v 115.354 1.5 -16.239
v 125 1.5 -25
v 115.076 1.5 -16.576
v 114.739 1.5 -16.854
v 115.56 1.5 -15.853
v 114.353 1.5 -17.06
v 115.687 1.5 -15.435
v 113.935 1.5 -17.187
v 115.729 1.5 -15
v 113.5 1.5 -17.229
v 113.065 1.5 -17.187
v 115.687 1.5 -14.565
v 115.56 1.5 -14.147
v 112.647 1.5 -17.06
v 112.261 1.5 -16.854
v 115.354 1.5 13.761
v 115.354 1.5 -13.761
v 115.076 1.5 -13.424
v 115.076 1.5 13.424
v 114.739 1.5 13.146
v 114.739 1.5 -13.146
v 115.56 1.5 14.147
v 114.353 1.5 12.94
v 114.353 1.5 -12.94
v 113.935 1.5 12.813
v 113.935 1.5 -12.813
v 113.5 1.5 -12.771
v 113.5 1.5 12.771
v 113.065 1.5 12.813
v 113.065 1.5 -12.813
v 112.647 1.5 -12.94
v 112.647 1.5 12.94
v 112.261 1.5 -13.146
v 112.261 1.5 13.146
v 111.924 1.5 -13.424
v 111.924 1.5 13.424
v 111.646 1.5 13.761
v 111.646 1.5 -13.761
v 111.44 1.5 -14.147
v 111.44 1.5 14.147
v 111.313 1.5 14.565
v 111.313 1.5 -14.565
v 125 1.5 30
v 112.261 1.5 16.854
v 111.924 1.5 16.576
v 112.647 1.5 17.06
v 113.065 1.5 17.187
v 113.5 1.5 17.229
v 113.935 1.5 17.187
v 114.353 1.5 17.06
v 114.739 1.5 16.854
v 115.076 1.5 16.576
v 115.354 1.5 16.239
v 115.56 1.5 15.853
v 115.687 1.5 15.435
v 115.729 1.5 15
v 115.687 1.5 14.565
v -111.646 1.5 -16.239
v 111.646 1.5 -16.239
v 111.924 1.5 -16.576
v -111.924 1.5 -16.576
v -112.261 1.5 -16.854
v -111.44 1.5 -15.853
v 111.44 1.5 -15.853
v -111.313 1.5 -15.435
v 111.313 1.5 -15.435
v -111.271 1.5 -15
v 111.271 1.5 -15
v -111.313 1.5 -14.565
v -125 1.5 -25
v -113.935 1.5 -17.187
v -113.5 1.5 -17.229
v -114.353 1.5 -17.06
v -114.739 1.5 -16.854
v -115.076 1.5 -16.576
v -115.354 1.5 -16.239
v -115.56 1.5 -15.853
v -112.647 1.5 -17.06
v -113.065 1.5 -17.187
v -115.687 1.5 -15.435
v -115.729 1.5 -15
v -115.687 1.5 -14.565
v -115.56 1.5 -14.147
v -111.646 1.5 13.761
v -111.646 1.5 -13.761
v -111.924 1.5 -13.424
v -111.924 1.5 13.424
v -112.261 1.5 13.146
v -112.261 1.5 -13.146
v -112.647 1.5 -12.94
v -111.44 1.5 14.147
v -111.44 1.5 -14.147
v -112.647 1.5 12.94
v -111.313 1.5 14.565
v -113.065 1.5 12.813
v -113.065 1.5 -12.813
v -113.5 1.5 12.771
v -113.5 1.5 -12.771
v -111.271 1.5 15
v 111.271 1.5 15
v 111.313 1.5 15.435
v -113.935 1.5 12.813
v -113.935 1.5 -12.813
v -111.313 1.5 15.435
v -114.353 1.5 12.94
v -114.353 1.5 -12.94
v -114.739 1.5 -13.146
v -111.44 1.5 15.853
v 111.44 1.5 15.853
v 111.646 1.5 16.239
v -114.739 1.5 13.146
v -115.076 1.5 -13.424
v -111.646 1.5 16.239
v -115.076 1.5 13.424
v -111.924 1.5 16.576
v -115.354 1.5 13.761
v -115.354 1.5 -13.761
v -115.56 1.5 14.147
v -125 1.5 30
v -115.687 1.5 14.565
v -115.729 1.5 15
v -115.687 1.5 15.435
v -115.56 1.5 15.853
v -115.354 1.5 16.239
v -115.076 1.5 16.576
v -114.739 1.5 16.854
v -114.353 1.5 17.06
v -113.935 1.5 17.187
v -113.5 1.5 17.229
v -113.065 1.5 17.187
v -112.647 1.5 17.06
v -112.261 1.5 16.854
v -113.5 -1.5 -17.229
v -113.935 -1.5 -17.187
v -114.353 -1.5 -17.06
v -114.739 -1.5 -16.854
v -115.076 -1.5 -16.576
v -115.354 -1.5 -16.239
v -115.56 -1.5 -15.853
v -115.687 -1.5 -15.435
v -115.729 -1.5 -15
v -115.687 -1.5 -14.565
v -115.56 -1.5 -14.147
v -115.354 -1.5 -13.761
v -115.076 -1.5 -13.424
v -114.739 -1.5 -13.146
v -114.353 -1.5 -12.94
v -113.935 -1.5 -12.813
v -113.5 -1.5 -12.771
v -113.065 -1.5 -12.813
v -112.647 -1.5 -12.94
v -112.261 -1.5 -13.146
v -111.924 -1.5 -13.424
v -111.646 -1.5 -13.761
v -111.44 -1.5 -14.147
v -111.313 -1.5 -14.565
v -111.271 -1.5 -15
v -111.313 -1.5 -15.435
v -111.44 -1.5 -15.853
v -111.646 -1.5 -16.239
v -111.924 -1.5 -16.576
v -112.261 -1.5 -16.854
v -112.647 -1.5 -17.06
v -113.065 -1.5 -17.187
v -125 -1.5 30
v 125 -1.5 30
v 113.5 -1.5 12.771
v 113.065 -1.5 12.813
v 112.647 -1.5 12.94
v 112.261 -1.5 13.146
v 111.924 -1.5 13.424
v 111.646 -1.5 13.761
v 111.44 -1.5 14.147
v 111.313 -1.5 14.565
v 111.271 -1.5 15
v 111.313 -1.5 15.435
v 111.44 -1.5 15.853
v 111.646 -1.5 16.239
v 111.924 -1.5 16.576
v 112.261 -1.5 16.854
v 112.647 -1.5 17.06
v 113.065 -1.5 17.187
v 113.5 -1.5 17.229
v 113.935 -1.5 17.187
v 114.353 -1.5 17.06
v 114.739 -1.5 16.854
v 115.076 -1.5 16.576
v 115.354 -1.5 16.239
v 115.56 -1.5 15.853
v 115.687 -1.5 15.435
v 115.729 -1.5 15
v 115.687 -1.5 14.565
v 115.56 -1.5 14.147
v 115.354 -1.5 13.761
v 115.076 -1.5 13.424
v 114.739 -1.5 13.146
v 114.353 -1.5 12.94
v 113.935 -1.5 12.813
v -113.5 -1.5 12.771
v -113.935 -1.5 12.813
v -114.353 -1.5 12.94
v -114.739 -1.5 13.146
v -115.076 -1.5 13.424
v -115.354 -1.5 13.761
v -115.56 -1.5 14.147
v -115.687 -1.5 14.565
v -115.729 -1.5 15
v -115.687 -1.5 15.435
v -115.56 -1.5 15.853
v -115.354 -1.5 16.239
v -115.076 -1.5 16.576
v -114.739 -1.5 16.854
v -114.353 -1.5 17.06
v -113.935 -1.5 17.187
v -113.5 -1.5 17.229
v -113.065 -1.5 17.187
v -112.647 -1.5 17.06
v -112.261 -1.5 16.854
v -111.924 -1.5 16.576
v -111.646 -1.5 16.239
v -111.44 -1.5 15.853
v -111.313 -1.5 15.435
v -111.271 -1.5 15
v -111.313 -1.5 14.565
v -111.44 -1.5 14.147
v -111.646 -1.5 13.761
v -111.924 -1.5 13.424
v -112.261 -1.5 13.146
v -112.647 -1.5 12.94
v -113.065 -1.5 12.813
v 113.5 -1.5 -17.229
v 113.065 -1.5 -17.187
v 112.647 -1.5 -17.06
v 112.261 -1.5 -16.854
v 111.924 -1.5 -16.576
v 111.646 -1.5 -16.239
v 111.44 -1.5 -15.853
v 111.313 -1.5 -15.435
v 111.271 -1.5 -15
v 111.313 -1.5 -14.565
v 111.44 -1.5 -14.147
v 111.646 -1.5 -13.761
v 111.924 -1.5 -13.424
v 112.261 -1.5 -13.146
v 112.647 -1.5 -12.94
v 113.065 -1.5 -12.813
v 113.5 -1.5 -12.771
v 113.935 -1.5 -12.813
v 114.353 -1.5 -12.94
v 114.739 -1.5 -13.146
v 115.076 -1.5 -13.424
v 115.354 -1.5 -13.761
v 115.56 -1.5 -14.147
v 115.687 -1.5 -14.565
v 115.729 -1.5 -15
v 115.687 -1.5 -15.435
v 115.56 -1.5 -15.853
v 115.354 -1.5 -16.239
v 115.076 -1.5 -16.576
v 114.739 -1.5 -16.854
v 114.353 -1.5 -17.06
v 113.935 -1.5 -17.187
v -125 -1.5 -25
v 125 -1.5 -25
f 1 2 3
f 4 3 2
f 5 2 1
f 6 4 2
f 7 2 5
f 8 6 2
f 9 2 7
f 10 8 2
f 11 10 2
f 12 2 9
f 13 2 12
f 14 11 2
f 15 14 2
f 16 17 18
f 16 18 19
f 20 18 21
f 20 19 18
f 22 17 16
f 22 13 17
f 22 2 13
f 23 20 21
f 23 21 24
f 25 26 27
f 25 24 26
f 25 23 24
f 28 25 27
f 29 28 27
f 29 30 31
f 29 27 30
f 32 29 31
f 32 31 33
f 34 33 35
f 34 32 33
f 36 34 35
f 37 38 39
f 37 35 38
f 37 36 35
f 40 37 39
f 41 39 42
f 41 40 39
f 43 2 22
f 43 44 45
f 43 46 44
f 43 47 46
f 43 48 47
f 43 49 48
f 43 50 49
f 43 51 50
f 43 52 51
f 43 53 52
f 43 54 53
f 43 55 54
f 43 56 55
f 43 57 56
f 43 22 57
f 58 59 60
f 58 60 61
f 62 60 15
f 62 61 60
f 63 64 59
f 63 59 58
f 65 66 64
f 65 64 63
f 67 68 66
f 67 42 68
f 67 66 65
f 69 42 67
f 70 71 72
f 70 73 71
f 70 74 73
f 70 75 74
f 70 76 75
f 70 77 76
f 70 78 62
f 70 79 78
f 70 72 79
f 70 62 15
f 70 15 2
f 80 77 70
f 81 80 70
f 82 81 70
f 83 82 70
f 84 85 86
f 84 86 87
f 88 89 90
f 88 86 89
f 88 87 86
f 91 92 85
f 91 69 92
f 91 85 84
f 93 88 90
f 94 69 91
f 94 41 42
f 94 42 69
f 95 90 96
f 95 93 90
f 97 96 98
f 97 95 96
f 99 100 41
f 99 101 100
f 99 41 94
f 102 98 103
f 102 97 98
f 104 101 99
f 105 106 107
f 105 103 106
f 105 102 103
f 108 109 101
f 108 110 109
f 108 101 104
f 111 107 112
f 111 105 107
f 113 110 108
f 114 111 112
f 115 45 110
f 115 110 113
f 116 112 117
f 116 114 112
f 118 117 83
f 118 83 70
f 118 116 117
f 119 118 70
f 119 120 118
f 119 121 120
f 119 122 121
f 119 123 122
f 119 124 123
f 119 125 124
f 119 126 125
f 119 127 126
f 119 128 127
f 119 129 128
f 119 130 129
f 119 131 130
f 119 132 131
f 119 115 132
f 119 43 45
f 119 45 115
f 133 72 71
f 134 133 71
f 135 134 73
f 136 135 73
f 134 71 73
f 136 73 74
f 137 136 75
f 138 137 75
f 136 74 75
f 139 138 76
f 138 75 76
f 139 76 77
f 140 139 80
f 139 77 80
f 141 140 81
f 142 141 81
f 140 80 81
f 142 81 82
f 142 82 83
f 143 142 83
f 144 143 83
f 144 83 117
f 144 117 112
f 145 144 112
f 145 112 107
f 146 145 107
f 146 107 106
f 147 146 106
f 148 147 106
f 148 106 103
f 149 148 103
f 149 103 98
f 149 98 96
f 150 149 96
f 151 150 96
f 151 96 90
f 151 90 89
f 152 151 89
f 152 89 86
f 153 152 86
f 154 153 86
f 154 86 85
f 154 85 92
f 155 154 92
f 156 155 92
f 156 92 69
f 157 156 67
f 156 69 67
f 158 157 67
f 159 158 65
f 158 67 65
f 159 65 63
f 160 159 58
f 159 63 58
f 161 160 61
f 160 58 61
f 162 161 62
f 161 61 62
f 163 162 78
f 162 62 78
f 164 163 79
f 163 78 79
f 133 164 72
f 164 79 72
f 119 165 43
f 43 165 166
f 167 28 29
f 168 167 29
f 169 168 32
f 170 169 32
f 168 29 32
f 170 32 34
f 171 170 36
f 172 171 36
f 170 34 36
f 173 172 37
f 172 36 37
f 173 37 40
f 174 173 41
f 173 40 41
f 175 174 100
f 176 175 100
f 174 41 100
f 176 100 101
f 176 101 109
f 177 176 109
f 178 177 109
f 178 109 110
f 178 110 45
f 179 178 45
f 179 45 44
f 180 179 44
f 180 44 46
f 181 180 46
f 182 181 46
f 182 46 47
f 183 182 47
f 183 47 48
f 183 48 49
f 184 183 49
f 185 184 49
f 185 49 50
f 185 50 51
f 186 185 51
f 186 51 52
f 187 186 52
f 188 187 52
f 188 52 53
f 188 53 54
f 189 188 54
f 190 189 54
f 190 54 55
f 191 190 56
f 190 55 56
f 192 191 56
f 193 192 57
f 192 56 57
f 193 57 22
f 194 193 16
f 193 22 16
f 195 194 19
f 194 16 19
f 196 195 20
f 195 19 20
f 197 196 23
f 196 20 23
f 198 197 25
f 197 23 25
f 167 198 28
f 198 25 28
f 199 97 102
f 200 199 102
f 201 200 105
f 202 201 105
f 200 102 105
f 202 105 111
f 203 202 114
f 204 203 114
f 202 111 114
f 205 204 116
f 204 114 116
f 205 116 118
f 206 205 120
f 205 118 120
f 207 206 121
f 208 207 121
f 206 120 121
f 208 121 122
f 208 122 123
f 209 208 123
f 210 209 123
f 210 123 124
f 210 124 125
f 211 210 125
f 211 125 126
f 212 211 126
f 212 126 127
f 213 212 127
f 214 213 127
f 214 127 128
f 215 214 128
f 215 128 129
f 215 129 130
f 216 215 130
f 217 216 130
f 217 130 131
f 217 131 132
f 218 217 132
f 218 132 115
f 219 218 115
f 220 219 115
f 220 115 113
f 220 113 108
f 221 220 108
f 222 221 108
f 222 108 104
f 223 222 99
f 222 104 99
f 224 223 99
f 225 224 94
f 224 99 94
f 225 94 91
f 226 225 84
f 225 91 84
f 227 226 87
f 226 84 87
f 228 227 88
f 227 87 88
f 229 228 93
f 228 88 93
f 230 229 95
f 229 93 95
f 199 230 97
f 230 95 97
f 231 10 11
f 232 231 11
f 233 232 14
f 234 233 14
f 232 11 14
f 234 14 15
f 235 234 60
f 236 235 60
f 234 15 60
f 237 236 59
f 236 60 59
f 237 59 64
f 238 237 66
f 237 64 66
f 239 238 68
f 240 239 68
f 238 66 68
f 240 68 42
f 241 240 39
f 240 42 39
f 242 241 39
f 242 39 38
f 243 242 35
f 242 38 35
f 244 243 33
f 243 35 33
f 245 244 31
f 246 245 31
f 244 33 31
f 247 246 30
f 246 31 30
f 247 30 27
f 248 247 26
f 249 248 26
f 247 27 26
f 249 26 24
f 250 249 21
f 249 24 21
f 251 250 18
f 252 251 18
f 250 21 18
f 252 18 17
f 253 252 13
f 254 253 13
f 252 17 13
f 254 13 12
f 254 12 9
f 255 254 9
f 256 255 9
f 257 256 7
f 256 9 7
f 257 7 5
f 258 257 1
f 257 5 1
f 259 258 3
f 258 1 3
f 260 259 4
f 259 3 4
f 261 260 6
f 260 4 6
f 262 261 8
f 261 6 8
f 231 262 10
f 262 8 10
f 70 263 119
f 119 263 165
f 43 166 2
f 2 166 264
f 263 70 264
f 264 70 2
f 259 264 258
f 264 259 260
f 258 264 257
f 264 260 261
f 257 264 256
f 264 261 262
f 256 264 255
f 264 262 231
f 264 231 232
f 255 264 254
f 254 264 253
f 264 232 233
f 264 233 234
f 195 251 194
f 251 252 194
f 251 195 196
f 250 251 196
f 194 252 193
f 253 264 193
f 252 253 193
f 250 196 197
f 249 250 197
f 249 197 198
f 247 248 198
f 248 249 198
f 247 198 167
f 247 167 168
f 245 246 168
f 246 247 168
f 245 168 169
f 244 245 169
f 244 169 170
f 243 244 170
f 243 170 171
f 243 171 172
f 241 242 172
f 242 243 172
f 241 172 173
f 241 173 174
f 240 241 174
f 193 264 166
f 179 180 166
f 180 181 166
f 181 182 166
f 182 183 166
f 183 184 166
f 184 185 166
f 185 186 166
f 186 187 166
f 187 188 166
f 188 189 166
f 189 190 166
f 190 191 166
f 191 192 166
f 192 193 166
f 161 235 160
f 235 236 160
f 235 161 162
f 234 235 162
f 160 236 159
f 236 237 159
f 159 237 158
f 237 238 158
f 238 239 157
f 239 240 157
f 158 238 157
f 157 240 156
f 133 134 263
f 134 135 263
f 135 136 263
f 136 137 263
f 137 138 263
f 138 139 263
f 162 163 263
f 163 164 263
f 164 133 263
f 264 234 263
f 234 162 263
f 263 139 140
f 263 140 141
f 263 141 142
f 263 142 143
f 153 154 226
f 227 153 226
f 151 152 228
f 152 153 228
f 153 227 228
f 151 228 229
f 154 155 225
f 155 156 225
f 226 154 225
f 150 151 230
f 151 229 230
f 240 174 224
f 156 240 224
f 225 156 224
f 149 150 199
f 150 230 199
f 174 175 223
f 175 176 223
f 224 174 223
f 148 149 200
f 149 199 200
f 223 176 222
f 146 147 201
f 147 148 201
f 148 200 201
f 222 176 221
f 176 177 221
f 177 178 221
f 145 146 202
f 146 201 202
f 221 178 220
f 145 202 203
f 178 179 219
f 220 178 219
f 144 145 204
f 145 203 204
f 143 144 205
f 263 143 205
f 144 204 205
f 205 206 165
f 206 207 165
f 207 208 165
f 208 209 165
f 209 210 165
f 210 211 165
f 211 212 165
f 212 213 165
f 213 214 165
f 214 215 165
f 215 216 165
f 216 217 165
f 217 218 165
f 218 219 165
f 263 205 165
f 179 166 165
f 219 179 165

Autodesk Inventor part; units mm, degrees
ref_plane "YZ Plane" through (0, 0, 0) normal (1, 0, 0) x (0, 1, 0)
ref_plane "XZ Plane" through (0, 0, 0) normal (0, 1, 0) x (-1, 0, 0)
ref_plane "XY Plane" through (0, 0, 0) normal (0, 0, 1) x (1, 0, 0)
sketch "Sketch1" plane through (0, 0, 0) normal (0, 1, 0) x (-1, 0, 0)
  line L0 (125, 30) -> (-125, 30)
  line L1 (-125, 30) -> (-125, -30)
  line L2 (-125, -30) -> (125, -30)
  line L3 (125, -30) -> (125, 30)
  line L4 (125, 30) -> (-125, -30) construction
  line L5 (-125, 30) -> (125, -30) construction
  point P0 (0, 0)
  dimension "d0" = 250
  dimension "d1" = 60
extrude "Extrusion1" add sketch "Sketch1" along normal mid plane 3
sketch "Sketch2" plane through (0, -1.5, 0) normal (0, -1, 0) x (1, 0, 0)
  line L0 (125, -30) -> (125, 30) projected
  line L1 (125, 30) -> (-125, 30) projected
  line L2 (-125, 30) -> (-125, -30) projected
  point P0 (0, 0)
  point P1 (113.5, 15)
  point P2 (113.5, -15)
  point P3 (-113.5, 15)
  point P4 (-113.5, -15)
  dimension "d9" = 11.5
  dimension "d10" = 15
  dimension "d11" = 30
  dimension "d12" = 11.5
hole "Hole1" at (113.5, -1.5, 15) at (113.5, -1.5, -15) at (-113.5, -1.5, 15) at (-113.5, -1.5, -15) direction (0, 1, 0) diameter 4.4587 depth 12.8 tip angle 118 thread size "M5x0.5" class "6H" standard "ISO Metric profile"
sketch "Sketch3" plane through (0, 1.5, 0) normal (0, 1, 0) x (1, 0, 0)
  line L0 (125, -23.3203) -> (125, -25.9184) projected
  line L1 (125, 30) -> (-125, 30) projected
  line L2 (-125, 30) -> (-125, -30) projected
  line L3 (125, 30) -> (-125, 30)
  line L4 (-125, 30) -> (-125, 25)
  line L5 (-125, 25) -> (125, 25)
  line L6 (125, 25) -> (125, 30)
  point P0 (0, 0)
  point P1 (125, 28.5858)
  dimension "d20" = 5
extrude "Extrusion2" cut sketch "Sketch3" against normal blind 3
properties part number "2309HCMUTE-CDT23_TAM-GA" material "PMMA Plastic"
